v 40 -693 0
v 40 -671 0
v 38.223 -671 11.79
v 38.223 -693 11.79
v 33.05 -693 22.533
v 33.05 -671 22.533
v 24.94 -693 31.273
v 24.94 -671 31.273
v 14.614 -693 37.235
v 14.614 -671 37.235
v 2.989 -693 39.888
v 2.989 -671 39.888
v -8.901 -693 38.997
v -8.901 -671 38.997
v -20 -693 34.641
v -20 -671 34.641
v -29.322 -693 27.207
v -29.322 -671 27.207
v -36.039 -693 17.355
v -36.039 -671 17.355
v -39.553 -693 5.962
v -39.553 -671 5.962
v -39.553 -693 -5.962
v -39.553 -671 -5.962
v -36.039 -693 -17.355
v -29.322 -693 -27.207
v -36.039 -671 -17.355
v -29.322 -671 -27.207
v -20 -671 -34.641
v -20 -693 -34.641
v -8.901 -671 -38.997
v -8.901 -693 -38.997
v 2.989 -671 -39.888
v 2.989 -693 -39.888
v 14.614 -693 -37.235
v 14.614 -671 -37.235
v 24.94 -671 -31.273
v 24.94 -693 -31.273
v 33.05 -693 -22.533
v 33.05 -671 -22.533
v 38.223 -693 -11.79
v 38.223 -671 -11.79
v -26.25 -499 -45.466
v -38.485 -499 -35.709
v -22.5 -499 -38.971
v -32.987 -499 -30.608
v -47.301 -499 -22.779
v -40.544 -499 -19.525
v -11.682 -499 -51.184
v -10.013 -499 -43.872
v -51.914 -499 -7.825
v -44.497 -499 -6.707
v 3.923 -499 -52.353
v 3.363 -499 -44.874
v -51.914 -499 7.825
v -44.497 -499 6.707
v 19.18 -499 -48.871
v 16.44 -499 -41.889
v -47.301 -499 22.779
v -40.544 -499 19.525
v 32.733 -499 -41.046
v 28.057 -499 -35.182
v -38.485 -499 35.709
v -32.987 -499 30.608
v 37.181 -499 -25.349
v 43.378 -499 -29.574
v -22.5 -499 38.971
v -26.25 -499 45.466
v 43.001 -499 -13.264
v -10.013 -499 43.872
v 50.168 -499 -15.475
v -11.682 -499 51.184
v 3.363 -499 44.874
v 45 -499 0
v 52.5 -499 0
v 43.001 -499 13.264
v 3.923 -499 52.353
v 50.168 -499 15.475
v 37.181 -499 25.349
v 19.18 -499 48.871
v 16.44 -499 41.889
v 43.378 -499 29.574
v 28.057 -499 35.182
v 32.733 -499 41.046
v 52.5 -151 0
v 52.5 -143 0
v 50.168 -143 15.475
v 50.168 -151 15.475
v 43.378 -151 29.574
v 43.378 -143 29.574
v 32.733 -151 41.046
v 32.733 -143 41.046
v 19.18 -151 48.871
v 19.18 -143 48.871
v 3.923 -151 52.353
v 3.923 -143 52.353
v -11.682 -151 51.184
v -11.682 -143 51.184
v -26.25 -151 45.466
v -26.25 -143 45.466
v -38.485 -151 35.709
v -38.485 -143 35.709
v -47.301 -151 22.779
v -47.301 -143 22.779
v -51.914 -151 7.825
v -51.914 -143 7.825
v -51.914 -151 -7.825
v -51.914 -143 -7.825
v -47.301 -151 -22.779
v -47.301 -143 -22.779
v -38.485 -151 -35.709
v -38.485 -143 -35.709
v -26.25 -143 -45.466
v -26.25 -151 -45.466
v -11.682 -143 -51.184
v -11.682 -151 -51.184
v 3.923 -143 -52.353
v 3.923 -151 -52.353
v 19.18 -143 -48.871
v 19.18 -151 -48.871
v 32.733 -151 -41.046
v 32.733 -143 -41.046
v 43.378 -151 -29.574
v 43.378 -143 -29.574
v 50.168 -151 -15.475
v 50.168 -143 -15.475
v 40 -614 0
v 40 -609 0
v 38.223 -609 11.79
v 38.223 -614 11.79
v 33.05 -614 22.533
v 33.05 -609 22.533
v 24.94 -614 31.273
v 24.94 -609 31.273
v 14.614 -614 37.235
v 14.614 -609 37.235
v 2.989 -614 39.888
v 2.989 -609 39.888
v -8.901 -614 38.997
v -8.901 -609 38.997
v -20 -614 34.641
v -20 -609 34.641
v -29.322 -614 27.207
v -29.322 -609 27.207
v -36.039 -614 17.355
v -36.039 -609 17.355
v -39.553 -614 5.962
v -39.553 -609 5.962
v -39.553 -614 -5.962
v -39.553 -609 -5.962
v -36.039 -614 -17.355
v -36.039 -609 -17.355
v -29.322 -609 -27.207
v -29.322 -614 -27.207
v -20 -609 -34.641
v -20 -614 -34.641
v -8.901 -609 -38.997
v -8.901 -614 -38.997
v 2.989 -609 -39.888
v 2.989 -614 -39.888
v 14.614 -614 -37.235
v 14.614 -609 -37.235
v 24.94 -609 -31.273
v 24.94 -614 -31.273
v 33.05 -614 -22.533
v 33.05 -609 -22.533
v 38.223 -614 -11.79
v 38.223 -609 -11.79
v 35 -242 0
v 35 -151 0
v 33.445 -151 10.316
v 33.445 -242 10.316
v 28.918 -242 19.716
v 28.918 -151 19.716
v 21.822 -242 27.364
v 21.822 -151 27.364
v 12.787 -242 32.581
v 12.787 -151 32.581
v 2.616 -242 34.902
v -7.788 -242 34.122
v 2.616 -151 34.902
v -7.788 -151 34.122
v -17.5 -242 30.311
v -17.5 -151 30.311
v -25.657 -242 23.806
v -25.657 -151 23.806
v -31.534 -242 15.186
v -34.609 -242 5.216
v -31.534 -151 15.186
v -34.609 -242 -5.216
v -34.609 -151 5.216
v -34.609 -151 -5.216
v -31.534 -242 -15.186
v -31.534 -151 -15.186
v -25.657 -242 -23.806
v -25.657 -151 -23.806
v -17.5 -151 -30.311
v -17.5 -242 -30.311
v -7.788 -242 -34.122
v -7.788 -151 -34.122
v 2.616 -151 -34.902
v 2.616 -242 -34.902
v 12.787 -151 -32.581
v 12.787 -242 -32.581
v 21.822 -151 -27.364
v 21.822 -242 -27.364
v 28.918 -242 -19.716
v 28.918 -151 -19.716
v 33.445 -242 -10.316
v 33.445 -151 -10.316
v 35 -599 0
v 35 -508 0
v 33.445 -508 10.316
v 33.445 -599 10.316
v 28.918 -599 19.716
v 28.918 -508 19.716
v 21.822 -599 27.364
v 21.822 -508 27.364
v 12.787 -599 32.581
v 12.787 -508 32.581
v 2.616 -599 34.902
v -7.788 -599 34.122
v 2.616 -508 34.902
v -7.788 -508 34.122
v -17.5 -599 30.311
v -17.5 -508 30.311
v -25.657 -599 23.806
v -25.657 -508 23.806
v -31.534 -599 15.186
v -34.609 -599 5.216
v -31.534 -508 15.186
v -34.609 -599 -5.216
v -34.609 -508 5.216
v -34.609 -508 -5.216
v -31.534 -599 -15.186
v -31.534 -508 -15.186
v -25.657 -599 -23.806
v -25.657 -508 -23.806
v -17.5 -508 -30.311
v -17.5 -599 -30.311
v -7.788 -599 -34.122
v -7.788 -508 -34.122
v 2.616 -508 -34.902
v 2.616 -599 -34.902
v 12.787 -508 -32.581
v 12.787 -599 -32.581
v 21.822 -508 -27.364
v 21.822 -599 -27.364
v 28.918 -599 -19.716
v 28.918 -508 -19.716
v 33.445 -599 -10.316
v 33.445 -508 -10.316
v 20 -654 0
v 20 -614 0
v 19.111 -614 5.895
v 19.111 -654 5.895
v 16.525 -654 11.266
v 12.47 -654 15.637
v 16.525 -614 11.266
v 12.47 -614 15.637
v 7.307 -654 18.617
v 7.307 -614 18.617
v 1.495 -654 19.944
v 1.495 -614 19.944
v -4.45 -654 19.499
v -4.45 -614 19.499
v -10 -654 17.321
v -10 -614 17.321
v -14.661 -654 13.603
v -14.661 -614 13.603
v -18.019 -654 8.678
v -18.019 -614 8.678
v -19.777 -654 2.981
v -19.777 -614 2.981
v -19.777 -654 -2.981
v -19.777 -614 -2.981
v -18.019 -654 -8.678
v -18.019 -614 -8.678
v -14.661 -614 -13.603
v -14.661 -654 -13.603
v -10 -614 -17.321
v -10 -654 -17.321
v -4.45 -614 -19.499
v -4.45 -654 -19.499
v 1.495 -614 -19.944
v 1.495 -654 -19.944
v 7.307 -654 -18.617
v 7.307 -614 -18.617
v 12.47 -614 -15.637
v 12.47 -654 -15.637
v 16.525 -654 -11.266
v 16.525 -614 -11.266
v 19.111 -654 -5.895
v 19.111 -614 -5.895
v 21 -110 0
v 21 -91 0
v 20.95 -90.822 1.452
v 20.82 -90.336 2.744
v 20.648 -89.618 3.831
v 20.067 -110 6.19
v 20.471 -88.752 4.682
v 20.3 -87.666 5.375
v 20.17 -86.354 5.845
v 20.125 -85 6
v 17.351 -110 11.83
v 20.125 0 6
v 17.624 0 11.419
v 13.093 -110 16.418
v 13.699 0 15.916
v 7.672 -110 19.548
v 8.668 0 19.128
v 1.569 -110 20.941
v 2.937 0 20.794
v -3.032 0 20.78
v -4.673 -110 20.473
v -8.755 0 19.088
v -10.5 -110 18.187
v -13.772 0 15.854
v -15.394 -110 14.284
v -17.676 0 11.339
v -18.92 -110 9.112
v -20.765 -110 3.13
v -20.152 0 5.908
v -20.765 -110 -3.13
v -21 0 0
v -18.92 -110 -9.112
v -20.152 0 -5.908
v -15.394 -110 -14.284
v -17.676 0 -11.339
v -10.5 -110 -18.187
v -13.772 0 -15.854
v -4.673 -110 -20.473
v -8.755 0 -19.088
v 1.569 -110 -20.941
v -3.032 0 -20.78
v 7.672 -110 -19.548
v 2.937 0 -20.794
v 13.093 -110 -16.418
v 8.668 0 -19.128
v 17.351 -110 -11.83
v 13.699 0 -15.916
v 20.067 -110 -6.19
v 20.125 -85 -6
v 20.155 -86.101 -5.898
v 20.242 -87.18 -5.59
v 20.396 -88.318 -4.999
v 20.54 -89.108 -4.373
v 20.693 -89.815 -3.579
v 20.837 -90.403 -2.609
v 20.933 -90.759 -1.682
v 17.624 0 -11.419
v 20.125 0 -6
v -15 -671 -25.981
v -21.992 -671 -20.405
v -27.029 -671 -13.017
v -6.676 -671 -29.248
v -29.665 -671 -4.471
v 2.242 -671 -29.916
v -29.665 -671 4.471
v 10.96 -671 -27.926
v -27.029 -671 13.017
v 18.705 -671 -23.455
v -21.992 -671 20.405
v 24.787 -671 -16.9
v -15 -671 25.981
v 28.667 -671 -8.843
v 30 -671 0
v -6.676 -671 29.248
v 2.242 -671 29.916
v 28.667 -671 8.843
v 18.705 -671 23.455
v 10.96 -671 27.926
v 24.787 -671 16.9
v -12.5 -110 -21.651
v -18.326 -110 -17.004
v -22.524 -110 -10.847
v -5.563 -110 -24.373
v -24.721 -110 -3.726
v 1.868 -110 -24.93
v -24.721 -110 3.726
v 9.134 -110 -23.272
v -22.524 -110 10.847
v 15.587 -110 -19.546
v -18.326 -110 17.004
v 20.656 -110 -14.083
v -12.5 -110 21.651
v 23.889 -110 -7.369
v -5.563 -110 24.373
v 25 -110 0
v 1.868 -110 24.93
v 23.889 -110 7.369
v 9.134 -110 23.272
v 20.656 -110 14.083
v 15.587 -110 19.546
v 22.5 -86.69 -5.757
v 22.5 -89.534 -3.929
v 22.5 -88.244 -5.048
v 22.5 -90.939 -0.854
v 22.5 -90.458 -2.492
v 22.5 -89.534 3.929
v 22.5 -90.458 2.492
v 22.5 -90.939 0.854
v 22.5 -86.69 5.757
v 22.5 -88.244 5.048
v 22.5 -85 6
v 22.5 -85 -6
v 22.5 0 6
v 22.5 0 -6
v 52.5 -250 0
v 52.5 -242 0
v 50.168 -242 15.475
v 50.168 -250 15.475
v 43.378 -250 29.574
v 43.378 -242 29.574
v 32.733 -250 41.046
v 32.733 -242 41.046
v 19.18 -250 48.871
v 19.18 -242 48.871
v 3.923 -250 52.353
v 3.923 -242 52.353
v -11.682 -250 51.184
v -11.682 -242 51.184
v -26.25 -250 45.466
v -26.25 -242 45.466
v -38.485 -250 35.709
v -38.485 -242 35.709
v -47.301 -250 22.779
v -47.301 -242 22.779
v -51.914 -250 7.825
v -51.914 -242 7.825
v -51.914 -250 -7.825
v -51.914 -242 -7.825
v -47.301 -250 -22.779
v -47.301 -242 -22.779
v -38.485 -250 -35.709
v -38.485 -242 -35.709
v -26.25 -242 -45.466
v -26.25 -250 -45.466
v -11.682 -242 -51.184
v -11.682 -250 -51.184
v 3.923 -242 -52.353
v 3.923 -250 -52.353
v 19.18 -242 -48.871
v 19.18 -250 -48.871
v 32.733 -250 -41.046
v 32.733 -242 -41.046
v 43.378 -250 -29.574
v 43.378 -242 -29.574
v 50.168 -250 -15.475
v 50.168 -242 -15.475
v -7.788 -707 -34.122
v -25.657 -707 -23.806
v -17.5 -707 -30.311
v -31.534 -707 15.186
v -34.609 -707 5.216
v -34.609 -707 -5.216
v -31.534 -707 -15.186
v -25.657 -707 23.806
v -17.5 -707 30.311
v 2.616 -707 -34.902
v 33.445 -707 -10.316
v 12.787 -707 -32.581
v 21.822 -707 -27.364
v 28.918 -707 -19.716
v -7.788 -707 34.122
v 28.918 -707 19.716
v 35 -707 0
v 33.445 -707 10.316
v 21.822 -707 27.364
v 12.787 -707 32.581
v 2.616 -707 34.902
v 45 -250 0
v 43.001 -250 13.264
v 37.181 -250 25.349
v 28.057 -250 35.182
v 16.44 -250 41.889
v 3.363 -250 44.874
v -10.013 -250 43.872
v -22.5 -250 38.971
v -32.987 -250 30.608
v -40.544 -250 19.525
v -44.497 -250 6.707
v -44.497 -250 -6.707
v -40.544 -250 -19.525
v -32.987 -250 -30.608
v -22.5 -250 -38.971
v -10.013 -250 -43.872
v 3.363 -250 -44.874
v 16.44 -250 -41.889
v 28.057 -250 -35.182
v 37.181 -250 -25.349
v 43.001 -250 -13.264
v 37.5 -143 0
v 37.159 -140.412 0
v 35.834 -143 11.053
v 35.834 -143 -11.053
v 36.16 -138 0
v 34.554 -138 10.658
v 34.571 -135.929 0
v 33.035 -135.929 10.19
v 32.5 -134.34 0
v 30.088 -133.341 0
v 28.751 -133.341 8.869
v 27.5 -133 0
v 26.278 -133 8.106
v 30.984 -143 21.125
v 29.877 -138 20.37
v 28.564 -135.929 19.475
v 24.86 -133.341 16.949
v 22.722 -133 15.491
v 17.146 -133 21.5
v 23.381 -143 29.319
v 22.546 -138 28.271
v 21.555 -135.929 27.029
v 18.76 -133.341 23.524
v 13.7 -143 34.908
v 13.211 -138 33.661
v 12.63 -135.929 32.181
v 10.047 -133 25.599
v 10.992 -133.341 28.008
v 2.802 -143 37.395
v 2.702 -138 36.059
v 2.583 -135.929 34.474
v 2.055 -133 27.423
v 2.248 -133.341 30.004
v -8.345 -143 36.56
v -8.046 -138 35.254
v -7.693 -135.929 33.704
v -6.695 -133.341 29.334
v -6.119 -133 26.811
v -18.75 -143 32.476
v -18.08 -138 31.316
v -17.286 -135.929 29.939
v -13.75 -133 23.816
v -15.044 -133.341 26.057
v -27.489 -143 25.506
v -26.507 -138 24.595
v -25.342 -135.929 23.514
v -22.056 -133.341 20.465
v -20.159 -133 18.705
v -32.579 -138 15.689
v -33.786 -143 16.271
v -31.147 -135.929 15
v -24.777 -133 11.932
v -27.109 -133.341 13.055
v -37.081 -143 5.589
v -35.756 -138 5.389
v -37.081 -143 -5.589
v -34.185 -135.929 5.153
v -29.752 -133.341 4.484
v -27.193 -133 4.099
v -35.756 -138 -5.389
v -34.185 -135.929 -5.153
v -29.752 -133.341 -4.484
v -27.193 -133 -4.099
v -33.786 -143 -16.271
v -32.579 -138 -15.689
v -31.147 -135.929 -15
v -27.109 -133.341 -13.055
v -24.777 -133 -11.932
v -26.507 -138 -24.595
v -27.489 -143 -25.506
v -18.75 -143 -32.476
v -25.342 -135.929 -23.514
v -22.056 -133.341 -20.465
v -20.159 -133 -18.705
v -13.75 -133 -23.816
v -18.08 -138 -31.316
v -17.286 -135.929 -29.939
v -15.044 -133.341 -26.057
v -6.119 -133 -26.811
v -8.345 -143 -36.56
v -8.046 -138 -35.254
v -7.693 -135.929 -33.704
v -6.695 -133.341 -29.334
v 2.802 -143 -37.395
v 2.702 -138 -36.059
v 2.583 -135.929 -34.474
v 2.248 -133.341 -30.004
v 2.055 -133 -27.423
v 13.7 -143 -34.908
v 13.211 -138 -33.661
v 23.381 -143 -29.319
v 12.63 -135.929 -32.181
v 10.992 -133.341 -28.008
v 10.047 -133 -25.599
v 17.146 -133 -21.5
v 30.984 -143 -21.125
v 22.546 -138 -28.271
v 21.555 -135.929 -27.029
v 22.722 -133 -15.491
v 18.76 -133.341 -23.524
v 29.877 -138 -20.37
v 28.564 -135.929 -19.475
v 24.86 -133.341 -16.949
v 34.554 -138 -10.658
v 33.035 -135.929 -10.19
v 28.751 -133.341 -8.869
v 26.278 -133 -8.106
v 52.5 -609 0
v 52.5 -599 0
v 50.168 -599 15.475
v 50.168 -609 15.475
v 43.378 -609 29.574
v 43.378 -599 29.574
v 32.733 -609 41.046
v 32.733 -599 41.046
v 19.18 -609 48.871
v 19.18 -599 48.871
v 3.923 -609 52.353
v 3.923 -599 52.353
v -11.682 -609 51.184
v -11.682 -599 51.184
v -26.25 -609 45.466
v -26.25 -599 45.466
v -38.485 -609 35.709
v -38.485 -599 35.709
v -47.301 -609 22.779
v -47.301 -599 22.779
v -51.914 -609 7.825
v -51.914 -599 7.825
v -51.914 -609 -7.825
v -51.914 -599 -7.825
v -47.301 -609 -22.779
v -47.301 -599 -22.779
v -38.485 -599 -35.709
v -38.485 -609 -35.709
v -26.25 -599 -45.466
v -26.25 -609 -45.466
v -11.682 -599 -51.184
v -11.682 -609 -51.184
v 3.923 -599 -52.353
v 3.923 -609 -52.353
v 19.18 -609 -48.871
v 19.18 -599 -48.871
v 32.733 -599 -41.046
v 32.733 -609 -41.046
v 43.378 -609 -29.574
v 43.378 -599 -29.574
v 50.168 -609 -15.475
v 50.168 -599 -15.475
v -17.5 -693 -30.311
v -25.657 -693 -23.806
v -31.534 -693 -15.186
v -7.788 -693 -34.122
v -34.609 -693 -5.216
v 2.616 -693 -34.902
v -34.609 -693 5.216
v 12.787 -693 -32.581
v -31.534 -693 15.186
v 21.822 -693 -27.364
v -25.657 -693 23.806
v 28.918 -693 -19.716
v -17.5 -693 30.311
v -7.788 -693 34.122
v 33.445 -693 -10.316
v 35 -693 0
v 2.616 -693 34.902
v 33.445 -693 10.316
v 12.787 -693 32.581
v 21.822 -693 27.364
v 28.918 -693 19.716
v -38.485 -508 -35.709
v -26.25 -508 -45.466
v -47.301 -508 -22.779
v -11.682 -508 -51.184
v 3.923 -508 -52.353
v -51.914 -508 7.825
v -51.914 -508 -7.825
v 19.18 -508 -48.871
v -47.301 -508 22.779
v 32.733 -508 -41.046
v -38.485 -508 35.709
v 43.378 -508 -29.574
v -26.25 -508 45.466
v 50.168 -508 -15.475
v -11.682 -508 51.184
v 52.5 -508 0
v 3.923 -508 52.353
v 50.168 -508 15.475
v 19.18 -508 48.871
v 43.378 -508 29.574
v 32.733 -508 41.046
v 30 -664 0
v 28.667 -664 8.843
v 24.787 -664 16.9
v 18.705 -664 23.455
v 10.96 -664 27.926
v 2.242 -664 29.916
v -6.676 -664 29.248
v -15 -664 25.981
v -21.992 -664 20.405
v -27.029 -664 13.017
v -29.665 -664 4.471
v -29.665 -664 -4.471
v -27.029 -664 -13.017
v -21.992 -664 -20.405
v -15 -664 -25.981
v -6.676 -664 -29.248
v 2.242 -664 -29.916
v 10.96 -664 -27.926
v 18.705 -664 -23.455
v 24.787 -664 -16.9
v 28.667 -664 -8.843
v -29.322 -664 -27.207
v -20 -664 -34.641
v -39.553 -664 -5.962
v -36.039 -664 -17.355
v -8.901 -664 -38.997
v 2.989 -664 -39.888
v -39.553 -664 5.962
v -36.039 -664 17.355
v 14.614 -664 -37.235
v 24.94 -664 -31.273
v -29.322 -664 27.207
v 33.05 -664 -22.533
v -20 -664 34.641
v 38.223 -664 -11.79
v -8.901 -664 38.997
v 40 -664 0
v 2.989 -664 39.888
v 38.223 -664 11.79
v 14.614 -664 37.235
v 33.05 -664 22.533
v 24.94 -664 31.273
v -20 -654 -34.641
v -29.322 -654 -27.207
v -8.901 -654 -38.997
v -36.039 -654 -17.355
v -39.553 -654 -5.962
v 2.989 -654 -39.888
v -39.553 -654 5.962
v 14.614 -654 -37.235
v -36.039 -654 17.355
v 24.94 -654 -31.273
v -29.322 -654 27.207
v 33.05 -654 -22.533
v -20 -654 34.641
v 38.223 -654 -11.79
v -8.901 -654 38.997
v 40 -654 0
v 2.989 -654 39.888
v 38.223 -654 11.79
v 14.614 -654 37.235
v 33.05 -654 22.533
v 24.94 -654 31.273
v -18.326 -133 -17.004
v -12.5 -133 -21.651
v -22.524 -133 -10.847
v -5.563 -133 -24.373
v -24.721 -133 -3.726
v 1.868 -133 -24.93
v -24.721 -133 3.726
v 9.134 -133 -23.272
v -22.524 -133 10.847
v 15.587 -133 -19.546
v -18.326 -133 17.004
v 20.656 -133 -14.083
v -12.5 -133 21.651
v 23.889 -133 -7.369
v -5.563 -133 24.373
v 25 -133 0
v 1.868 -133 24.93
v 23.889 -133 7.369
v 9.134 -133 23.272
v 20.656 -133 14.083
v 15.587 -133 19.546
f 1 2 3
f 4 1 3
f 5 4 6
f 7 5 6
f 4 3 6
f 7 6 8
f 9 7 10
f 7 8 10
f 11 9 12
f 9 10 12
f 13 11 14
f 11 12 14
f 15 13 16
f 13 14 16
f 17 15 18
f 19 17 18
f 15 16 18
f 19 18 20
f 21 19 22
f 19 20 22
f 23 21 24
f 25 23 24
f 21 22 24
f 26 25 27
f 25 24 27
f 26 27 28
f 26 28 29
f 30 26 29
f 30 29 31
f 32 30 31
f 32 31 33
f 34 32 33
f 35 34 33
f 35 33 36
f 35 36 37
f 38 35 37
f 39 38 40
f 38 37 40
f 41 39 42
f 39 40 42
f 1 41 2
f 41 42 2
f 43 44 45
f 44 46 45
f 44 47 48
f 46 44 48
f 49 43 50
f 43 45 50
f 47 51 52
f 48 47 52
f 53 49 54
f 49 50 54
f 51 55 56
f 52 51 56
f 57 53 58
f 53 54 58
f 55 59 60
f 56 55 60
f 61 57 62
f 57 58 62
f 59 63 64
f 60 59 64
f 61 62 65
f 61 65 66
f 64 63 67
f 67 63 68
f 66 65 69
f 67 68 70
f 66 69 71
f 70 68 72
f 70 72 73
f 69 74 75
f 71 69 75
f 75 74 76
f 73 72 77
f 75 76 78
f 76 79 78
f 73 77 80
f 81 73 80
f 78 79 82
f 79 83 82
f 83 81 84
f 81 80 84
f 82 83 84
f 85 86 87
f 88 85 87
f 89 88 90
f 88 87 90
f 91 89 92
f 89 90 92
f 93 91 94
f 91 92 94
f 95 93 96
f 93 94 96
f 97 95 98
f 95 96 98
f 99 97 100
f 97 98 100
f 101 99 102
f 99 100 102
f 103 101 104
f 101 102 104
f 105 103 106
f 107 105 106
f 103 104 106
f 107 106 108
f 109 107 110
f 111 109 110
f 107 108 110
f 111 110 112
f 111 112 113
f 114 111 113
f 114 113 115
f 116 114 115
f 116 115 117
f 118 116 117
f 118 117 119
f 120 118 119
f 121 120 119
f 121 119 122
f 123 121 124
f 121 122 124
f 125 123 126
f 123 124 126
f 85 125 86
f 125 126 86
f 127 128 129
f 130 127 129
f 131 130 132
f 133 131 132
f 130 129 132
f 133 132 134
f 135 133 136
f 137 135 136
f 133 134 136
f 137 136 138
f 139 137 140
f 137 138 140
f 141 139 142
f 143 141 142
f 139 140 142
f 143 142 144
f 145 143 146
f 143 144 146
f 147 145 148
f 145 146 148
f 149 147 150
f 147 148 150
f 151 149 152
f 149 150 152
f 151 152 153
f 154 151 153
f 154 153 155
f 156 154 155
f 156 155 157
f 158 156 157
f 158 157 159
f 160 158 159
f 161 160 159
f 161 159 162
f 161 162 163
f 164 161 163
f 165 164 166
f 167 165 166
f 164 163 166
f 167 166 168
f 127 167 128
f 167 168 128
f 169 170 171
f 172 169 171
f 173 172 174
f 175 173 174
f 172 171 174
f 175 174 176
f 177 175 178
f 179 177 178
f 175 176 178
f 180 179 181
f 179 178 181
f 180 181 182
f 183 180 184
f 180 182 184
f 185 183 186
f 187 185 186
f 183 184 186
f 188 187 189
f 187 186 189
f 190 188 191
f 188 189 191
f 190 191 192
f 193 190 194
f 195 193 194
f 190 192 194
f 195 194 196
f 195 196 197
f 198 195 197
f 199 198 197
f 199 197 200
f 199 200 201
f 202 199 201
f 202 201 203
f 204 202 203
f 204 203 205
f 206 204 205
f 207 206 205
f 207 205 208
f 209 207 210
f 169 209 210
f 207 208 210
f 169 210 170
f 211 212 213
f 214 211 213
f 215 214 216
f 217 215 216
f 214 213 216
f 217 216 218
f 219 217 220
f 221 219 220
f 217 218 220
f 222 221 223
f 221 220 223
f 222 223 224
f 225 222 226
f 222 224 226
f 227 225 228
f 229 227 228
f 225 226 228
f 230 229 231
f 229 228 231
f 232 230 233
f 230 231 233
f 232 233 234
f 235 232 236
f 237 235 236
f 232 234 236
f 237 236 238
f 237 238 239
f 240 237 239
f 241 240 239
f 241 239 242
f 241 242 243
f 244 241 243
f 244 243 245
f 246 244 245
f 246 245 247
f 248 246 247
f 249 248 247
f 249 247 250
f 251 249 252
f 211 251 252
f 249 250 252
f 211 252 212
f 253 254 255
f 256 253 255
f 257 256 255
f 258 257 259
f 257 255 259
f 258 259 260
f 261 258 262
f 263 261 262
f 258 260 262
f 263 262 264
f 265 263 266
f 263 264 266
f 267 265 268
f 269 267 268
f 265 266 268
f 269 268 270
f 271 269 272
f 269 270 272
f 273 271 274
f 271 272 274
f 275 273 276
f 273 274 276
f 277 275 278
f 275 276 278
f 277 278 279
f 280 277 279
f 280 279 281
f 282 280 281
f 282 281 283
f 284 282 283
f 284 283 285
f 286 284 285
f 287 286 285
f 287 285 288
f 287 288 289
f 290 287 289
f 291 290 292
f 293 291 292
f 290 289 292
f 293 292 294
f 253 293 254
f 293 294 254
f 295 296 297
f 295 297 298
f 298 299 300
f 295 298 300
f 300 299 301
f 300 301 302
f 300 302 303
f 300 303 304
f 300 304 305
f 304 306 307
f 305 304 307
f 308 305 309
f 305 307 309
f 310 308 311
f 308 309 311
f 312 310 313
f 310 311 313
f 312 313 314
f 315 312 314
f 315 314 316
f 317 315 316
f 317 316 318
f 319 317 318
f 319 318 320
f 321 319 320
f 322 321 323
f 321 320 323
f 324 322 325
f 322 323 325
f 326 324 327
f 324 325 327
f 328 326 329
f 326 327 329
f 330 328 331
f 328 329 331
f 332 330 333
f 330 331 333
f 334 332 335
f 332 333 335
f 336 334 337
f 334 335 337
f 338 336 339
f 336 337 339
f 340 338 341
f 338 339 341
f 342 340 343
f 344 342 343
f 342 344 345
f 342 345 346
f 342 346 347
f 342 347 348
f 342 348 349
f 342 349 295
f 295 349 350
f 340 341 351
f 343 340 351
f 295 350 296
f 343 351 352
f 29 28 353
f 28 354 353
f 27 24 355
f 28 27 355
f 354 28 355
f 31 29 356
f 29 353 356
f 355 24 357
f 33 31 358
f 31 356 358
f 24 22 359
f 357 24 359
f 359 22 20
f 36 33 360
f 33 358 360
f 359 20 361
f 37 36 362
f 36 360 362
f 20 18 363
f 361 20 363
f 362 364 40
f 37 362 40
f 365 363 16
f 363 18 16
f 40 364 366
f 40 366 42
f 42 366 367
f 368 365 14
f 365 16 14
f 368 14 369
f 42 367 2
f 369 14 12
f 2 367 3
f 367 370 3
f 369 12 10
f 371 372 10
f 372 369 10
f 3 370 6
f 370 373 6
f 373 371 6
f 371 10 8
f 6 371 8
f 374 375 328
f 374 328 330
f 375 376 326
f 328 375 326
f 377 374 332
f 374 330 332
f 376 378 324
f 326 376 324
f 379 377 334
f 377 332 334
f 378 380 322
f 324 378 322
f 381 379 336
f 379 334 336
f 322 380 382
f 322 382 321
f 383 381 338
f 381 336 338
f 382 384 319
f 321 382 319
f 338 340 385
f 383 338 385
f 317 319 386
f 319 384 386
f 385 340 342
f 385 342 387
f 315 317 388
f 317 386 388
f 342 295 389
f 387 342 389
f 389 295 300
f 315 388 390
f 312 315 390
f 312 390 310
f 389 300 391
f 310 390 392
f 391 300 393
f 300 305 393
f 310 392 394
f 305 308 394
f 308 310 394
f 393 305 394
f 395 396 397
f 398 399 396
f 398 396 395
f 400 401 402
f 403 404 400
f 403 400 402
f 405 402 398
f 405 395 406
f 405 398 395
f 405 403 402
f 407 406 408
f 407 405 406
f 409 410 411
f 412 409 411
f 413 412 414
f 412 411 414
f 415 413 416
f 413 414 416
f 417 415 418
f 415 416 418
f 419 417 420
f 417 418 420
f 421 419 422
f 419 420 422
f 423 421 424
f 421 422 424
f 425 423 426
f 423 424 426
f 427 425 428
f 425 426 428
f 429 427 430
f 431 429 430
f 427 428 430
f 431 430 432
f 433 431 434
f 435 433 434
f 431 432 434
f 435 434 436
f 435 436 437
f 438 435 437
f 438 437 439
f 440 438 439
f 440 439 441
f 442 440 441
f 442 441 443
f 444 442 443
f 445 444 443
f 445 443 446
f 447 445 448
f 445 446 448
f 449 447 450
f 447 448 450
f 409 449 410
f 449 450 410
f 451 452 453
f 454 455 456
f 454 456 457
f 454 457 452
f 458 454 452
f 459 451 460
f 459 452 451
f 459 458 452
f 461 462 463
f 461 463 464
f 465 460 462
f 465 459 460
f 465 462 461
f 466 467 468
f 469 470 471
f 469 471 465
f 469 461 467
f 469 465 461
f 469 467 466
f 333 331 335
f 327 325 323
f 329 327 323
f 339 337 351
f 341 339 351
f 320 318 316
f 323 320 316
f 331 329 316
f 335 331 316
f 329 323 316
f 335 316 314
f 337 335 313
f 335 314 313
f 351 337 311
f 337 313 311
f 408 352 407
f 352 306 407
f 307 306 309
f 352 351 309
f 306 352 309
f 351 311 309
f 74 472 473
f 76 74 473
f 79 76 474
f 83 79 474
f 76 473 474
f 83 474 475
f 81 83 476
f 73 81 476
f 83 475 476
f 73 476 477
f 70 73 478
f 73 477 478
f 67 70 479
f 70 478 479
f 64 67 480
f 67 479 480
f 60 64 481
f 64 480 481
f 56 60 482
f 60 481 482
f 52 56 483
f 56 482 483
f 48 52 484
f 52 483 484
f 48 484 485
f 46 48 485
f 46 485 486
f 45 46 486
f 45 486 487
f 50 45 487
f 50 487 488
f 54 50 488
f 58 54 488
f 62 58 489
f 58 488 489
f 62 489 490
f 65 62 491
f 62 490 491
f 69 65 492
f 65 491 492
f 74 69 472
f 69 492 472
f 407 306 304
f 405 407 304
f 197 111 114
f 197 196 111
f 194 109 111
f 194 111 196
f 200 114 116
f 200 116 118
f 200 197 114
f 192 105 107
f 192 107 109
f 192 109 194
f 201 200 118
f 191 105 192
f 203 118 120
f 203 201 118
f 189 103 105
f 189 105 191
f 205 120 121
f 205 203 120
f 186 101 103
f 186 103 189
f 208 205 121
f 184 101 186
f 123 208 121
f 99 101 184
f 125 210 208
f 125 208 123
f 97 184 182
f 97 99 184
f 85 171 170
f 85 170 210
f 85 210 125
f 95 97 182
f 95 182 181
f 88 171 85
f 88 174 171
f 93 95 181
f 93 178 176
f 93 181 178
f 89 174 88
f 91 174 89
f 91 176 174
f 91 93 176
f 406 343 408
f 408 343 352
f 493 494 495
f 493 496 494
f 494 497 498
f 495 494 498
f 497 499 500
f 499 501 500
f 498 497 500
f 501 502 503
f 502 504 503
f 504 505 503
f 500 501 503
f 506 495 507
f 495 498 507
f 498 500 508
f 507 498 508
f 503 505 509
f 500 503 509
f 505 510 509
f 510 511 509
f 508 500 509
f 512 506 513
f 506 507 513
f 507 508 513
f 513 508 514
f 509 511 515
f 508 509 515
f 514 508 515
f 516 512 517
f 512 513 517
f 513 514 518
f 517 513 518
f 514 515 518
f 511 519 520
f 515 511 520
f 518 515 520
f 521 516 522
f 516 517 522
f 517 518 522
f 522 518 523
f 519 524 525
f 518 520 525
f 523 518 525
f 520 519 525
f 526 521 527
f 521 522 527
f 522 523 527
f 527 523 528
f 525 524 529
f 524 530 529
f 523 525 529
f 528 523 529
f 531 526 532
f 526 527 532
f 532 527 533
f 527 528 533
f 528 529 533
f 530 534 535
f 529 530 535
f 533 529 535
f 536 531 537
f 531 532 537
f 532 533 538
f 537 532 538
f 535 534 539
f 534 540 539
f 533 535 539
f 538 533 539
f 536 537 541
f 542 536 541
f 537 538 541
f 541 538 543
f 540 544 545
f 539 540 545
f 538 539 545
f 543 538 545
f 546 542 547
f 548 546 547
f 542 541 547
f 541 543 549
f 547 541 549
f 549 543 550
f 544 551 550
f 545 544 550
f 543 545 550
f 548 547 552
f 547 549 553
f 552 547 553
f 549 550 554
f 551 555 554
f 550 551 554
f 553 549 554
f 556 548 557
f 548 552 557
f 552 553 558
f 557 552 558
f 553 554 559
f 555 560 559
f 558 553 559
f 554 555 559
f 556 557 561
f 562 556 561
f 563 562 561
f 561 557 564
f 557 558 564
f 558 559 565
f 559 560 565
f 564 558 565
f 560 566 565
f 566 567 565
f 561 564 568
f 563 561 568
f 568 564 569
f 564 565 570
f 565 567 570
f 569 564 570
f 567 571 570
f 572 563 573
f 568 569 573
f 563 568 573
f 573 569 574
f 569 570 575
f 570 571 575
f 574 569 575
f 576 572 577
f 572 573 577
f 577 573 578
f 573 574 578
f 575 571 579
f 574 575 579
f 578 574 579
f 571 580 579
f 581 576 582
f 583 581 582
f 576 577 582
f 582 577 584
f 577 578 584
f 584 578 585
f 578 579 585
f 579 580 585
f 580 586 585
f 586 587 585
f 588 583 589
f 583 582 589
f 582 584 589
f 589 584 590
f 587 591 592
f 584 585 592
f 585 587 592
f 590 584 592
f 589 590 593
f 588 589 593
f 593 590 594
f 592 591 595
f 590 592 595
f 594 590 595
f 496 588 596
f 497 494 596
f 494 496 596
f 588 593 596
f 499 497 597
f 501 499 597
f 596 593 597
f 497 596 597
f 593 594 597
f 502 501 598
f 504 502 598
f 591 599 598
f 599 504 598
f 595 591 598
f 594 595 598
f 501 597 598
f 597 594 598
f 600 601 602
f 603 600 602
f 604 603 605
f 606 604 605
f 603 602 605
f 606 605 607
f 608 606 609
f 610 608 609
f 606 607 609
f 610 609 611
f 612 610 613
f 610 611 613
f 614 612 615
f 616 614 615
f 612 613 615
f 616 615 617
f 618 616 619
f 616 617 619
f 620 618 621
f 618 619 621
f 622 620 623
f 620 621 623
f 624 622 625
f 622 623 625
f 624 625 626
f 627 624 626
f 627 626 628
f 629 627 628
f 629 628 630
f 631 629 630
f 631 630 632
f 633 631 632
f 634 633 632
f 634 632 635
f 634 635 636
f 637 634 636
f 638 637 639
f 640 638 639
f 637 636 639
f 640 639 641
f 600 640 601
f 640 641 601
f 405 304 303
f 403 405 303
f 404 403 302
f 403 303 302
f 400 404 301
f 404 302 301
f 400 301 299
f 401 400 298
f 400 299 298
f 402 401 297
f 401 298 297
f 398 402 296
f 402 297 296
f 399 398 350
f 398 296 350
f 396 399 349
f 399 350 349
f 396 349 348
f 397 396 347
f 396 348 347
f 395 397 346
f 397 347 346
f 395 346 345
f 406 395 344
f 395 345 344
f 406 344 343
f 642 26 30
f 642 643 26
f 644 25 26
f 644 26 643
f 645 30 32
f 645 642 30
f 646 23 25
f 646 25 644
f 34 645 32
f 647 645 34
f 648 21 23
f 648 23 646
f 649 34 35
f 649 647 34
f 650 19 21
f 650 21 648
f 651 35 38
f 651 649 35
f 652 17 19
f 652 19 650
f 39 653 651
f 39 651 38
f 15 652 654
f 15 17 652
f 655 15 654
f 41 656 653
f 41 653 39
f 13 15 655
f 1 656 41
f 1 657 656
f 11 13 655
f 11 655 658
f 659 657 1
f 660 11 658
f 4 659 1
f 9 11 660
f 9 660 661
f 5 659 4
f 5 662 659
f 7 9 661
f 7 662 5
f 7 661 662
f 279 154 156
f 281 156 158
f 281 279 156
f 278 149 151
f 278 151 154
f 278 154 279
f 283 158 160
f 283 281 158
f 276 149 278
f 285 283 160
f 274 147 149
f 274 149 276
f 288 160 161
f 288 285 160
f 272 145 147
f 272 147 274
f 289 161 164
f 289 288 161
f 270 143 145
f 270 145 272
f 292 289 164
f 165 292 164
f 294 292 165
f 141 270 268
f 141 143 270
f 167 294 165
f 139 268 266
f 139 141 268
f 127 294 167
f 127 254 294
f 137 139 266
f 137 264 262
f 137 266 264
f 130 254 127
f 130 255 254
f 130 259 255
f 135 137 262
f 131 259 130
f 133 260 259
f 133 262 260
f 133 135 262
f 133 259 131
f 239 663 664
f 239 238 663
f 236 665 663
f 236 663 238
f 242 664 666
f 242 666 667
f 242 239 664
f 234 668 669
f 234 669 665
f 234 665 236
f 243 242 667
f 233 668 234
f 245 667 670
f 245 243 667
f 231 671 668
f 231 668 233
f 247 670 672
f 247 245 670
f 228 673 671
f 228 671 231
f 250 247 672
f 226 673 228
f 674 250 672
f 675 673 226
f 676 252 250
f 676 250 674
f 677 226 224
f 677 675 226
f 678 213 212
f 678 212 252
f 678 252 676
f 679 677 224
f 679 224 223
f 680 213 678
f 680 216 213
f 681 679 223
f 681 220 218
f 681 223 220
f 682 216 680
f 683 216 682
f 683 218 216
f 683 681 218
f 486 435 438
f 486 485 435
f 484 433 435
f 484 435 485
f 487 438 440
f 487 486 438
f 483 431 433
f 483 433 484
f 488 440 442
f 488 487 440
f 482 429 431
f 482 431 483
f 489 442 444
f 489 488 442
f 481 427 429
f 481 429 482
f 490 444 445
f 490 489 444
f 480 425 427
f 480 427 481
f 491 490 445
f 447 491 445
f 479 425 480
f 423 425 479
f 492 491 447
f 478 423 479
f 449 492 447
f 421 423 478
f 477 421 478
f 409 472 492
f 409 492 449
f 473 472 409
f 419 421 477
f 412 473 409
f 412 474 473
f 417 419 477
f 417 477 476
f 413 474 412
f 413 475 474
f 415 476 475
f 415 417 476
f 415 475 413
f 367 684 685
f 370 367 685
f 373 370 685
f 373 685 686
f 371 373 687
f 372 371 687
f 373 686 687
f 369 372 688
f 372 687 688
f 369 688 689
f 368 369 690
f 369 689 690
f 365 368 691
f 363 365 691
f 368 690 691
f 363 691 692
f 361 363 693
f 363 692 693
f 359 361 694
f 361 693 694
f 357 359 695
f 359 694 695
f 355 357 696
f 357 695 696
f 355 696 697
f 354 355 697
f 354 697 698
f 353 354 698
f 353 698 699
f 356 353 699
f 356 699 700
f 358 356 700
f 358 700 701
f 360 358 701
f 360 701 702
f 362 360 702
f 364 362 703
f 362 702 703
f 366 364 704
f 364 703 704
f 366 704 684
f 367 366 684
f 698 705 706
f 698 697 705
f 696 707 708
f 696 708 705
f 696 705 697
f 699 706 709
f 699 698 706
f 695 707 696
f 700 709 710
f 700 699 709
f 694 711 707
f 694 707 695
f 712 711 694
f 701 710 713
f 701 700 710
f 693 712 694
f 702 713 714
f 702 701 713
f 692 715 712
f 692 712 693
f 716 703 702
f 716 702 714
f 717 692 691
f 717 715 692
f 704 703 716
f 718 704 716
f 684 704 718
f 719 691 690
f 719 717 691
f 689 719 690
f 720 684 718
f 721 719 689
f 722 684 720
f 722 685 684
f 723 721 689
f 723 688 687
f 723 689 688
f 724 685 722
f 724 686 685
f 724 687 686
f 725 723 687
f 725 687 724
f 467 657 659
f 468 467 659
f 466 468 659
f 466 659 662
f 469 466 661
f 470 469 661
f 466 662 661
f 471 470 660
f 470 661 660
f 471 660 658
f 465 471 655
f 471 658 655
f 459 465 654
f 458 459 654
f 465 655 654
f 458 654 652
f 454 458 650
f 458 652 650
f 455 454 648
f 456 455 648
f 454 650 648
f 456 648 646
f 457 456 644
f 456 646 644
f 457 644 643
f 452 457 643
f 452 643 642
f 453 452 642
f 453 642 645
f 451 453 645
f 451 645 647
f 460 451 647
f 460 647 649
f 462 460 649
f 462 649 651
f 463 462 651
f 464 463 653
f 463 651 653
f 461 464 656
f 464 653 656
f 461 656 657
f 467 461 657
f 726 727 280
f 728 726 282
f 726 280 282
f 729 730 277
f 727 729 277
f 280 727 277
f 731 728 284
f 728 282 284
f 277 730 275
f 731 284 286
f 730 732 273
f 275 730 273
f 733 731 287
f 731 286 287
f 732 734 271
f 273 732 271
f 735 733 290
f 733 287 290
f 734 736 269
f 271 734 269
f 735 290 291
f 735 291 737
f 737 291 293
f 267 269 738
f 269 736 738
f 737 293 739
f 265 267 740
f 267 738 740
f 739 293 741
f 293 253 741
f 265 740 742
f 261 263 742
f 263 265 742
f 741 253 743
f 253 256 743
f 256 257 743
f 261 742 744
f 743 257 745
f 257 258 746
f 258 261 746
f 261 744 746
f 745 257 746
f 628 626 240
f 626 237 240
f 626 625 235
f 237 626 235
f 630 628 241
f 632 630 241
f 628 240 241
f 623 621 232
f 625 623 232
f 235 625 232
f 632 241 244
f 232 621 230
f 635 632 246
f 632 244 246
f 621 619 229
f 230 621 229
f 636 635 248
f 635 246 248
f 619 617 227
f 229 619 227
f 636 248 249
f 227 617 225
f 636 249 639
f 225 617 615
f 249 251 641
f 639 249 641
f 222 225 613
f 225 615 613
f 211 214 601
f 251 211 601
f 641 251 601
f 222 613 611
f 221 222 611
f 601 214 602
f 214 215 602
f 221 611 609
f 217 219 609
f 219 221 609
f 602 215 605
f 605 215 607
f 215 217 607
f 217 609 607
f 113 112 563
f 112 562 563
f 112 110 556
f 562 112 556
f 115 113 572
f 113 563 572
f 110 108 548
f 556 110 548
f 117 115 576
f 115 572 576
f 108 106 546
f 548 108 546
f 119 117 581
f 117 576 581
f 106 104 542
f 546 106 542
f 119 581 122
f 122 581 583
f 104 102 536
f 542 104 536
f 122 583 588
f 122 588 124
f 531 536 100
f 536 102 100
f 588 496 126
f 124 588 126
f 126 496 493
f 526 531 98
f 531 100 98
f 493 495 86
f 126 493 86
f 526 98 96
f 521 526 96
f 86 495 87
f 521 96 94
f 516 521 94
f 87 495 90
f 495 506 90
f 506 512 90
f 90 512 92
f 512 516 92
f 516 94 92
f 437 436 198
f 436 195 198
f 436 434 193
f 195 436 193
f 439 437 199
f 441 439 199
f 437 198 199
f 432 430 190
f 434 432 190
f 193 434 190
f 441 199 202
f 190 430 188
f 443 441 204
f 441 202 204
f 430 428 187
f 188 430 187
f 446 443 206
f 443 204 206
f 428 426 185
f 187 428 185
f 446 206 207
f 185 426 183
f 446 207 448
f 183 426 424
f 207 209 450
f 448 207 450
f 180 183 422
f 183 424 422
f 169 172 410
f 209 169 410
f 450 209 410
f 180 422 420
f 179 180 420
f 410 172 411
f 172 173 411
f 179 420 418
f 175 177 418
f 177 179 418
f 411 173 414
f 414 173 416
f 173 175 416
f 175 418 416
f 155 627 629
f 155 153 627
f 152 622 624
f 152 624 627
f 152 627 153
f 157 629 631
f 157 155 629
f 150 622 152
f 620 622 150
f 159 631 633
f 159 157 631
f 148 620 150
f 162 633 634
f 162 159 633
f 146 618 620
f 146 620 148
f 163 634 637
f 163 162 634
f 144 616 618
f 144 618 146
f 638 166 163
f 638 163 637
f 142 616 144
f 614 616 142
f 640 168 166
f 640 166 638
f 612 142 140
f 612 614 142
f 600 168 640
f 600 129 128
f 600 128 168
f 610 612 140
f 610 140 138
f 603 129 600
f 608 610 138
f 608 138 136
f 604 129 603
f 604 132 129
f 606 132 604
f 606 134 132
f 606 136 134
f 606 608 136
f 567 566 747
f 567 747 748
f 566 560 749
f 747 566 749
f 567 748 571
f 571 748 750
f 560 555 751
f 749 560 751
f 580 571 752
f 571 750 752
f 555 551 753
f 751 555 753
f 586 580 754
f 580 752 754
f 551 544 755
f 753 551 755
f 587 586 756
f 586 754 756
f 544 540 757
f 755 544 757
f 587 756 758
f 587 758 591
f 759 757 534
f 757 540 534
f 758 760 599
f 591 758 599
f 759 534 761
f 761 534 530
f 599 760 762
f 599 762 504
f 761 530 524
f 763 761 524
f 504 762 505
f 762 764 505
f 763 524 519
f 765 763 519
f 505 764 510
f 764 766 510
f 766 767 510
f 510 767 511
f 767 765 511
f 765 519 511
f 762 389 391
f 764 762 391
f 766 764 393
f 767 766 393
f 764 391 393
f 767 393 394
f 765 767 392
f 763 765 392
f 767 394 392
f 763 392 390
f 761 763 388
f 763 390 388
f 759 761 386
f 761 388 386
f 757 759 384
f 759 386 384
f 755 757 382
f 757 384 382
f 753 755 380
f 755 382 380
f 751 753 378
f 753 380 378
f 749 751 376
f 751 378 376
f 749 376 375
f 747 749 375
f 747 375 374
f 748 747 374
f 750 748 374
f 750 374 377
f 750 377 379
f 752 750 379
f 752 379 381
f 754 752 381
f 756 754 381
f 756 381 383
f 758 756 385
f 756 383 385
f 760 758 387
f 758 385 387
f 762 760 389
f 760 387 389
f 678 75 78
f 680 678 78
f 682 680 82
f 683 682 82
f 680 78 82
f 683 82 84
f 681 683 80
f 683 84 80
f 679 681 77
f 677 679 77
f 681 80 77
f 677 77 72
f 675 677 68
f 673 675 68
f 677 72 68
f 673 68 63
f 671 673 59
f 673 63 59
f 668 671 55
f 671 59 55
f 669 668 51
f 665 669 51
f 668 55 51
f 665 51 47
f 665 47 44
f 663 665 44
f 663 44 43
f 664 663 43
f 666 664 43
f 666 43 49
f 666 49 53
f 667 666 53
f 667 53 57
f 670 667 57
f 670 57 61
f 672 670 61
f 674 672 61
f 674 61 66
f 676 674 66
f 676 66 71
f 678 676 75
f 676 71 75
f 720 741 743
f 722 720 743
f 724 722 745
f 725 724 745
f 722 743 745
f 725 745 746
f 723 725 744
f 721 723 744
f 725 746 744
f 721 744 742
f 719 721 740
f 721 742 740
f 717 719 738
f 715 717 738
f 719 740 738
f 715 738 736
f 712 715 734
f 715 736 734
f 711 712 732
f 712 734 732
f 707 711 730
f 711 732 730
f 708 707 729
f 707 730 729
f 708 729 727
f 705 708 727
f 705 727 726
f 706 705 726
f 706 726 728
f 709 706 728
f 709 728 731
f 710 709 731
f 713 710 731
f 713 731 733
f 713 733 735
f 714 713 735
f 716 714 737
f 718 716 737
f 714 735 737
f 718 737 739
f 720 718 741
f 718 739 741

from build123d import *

# Parameters (mm, degrees)
F0_R      = 21
F1_DEPTH  = 110
F3_DEPTH  = 22.5
F4_R      = 25
F5_DEPTH  = 23
F6_R      = 37.5
F7_DEPTH  = 10
F8_R      = 9.99999
F9_R      = 52.5
F9_R_2    = 37.5
F10_DEPTH = 8
F11_R     = 35
F12_DEPTH = 91
F13_R     = 52.5
F14_DEPTH = 8
F15_R     = 45
F16_DEPTH = 249
F17_R     = 52.5
F18_DEPTH = 9
F19_R     = 35
F20_DEPTH = 91
F21_R     = 52.5
F22_DEPTH = 10
F23_R     = 40
F24_DEPTH = 5
F25_R     = 20
F26_DEPTH = 40
F27_R     = 40
F28_DEPTH = 10
F29_R     = 30
F30_DEPTH = 7
F31_R     = 40
F32_DEPTH = 22
F33_R     = 35
F34_DEPTH = 14


# Not quite as in the source:
# - a fillet or chamfer is up to 0.001 mm smaller than in the source, because OpenCascade refuses the exact size


with BuildPart() as f1:
    # F0 (on Front) → F1 (new body)
    with BuildSketch(Plane.XZ):
        Circle(F0_R)
    extrude(amount=F1_DEPTH)

    # F2 (on Right) → F3 (join)
    with BuildSketch(Plane.YZ):
        with BuildLine():
            Line((0, -6), (0, 6))
            Line((0, 6), (-85, 6))
            ThreePointArc((-85, 6), (-91, 0), (-85, -6))
            Line((-85, -6), (0, -6))
        make_face()
    extrude(amount=F3_DEPTH)

    # F4 (on face) → F5 (join)
    with BuildSketch(Plane.XZ.offset(110)):
        Circle(F4_R)
    extrude(amount=F5_DEPTH)

    # F6 (on face) → F7 (join)
    with BuildSketch(Plane.XZ.offset(133)):
        Circle(F6_R)
    extrude(amount=F7_DEPTH)

    # F8 (radius 10 in the source; OpenCascade refuses exactly that, so slightly less here)
    f8_edges = [f1.edges().sort_by_distance(p)[0] for p in [
        (-37.5, -133, 0),
    ]]
    fillet(f8_edges, radius=F8_R)

    # F9 (on face) → F10 (join)
    with BuildSketch(Plane.XZ.offset(143)):
        Circle(F9_R)
        Circle(F9_R_2, mode=Mode.SUBTRACT)
        Circle(F9_R_2)
    extrude(amount=F10_DEPTH)

    # F11 (on face) → F12 (join)
    with BuildSketch(Plane.XZ.offset(151)):
        Circle(F11_R)
    extrude(amount=F12_DEPTH)

    # F13 (on face) → F14 (join)
    with BuildSketch(Plane.XZ.offset(242)):
        Circle(F13_R)
    extrude(amount=F14_DEPTH)

    # F15 (on face) → F16 (join)
    with BuildSketch(Plane.XZ.offset(250)):
        Circle(F15_R)
    extrude(amount=F16_DEPTH)

    # F17 (on face) → F18 (join)
    with BuildSketch(Plane.XZ.offset(499)):
        Circle(F17_R)
    extrude(amount=F18_DEPTH)

    # F19 (on face) → F20 (join)
    with BuildSketch(Plane.XZ.offset(508)):
        Circle(F19_R)
    extrude(amount=F20_DEPTH)

    # F21 (on face) → F22 (join)
    with BuildSketch(Plane.XZ.offset(599)):
        Circle(F21_R)
    extrude(amount=F22_DEPTH)

    # F23 (on face) → F24 (join)
    with BuildSketch(Plane.XZ.offset(609)):
        Circle(F23_R)
    extrude(amount=F24_DEPTH)

    # F25 (on face) → F26 (join)
    with BuildSketch(Plane.XZ.offset(614)):
        Circle(F25_R)
    extrude(amount=F26_DEPTH)

    # F27 (on face) → F28 (join)
    with BuildSketch(Plane.XZ.offset(654)):
        Circle(F27_R)
    extrude(amount=F28_DEPTH)

    # F29 (on face) → F30 (join)
    with BuildSketch(Plane.XZ.offset(664)):
        Circle(F29_R)
    extrude(amount=F30_DEPTH)

    # F31 (on face) → F32 (join)
    with BuildSketch(Plane.XZ.offset(671)):
        Circle(F31_R)
    extrude(amount=F32_DEPTH)

    # F33 (on face) → F34 (join)
    with BuildSketch(Plane.XZ.offset(693)):
        Circle(F33_R)
    extrude(amount=F34_DEPTH)


solid = f1.part
